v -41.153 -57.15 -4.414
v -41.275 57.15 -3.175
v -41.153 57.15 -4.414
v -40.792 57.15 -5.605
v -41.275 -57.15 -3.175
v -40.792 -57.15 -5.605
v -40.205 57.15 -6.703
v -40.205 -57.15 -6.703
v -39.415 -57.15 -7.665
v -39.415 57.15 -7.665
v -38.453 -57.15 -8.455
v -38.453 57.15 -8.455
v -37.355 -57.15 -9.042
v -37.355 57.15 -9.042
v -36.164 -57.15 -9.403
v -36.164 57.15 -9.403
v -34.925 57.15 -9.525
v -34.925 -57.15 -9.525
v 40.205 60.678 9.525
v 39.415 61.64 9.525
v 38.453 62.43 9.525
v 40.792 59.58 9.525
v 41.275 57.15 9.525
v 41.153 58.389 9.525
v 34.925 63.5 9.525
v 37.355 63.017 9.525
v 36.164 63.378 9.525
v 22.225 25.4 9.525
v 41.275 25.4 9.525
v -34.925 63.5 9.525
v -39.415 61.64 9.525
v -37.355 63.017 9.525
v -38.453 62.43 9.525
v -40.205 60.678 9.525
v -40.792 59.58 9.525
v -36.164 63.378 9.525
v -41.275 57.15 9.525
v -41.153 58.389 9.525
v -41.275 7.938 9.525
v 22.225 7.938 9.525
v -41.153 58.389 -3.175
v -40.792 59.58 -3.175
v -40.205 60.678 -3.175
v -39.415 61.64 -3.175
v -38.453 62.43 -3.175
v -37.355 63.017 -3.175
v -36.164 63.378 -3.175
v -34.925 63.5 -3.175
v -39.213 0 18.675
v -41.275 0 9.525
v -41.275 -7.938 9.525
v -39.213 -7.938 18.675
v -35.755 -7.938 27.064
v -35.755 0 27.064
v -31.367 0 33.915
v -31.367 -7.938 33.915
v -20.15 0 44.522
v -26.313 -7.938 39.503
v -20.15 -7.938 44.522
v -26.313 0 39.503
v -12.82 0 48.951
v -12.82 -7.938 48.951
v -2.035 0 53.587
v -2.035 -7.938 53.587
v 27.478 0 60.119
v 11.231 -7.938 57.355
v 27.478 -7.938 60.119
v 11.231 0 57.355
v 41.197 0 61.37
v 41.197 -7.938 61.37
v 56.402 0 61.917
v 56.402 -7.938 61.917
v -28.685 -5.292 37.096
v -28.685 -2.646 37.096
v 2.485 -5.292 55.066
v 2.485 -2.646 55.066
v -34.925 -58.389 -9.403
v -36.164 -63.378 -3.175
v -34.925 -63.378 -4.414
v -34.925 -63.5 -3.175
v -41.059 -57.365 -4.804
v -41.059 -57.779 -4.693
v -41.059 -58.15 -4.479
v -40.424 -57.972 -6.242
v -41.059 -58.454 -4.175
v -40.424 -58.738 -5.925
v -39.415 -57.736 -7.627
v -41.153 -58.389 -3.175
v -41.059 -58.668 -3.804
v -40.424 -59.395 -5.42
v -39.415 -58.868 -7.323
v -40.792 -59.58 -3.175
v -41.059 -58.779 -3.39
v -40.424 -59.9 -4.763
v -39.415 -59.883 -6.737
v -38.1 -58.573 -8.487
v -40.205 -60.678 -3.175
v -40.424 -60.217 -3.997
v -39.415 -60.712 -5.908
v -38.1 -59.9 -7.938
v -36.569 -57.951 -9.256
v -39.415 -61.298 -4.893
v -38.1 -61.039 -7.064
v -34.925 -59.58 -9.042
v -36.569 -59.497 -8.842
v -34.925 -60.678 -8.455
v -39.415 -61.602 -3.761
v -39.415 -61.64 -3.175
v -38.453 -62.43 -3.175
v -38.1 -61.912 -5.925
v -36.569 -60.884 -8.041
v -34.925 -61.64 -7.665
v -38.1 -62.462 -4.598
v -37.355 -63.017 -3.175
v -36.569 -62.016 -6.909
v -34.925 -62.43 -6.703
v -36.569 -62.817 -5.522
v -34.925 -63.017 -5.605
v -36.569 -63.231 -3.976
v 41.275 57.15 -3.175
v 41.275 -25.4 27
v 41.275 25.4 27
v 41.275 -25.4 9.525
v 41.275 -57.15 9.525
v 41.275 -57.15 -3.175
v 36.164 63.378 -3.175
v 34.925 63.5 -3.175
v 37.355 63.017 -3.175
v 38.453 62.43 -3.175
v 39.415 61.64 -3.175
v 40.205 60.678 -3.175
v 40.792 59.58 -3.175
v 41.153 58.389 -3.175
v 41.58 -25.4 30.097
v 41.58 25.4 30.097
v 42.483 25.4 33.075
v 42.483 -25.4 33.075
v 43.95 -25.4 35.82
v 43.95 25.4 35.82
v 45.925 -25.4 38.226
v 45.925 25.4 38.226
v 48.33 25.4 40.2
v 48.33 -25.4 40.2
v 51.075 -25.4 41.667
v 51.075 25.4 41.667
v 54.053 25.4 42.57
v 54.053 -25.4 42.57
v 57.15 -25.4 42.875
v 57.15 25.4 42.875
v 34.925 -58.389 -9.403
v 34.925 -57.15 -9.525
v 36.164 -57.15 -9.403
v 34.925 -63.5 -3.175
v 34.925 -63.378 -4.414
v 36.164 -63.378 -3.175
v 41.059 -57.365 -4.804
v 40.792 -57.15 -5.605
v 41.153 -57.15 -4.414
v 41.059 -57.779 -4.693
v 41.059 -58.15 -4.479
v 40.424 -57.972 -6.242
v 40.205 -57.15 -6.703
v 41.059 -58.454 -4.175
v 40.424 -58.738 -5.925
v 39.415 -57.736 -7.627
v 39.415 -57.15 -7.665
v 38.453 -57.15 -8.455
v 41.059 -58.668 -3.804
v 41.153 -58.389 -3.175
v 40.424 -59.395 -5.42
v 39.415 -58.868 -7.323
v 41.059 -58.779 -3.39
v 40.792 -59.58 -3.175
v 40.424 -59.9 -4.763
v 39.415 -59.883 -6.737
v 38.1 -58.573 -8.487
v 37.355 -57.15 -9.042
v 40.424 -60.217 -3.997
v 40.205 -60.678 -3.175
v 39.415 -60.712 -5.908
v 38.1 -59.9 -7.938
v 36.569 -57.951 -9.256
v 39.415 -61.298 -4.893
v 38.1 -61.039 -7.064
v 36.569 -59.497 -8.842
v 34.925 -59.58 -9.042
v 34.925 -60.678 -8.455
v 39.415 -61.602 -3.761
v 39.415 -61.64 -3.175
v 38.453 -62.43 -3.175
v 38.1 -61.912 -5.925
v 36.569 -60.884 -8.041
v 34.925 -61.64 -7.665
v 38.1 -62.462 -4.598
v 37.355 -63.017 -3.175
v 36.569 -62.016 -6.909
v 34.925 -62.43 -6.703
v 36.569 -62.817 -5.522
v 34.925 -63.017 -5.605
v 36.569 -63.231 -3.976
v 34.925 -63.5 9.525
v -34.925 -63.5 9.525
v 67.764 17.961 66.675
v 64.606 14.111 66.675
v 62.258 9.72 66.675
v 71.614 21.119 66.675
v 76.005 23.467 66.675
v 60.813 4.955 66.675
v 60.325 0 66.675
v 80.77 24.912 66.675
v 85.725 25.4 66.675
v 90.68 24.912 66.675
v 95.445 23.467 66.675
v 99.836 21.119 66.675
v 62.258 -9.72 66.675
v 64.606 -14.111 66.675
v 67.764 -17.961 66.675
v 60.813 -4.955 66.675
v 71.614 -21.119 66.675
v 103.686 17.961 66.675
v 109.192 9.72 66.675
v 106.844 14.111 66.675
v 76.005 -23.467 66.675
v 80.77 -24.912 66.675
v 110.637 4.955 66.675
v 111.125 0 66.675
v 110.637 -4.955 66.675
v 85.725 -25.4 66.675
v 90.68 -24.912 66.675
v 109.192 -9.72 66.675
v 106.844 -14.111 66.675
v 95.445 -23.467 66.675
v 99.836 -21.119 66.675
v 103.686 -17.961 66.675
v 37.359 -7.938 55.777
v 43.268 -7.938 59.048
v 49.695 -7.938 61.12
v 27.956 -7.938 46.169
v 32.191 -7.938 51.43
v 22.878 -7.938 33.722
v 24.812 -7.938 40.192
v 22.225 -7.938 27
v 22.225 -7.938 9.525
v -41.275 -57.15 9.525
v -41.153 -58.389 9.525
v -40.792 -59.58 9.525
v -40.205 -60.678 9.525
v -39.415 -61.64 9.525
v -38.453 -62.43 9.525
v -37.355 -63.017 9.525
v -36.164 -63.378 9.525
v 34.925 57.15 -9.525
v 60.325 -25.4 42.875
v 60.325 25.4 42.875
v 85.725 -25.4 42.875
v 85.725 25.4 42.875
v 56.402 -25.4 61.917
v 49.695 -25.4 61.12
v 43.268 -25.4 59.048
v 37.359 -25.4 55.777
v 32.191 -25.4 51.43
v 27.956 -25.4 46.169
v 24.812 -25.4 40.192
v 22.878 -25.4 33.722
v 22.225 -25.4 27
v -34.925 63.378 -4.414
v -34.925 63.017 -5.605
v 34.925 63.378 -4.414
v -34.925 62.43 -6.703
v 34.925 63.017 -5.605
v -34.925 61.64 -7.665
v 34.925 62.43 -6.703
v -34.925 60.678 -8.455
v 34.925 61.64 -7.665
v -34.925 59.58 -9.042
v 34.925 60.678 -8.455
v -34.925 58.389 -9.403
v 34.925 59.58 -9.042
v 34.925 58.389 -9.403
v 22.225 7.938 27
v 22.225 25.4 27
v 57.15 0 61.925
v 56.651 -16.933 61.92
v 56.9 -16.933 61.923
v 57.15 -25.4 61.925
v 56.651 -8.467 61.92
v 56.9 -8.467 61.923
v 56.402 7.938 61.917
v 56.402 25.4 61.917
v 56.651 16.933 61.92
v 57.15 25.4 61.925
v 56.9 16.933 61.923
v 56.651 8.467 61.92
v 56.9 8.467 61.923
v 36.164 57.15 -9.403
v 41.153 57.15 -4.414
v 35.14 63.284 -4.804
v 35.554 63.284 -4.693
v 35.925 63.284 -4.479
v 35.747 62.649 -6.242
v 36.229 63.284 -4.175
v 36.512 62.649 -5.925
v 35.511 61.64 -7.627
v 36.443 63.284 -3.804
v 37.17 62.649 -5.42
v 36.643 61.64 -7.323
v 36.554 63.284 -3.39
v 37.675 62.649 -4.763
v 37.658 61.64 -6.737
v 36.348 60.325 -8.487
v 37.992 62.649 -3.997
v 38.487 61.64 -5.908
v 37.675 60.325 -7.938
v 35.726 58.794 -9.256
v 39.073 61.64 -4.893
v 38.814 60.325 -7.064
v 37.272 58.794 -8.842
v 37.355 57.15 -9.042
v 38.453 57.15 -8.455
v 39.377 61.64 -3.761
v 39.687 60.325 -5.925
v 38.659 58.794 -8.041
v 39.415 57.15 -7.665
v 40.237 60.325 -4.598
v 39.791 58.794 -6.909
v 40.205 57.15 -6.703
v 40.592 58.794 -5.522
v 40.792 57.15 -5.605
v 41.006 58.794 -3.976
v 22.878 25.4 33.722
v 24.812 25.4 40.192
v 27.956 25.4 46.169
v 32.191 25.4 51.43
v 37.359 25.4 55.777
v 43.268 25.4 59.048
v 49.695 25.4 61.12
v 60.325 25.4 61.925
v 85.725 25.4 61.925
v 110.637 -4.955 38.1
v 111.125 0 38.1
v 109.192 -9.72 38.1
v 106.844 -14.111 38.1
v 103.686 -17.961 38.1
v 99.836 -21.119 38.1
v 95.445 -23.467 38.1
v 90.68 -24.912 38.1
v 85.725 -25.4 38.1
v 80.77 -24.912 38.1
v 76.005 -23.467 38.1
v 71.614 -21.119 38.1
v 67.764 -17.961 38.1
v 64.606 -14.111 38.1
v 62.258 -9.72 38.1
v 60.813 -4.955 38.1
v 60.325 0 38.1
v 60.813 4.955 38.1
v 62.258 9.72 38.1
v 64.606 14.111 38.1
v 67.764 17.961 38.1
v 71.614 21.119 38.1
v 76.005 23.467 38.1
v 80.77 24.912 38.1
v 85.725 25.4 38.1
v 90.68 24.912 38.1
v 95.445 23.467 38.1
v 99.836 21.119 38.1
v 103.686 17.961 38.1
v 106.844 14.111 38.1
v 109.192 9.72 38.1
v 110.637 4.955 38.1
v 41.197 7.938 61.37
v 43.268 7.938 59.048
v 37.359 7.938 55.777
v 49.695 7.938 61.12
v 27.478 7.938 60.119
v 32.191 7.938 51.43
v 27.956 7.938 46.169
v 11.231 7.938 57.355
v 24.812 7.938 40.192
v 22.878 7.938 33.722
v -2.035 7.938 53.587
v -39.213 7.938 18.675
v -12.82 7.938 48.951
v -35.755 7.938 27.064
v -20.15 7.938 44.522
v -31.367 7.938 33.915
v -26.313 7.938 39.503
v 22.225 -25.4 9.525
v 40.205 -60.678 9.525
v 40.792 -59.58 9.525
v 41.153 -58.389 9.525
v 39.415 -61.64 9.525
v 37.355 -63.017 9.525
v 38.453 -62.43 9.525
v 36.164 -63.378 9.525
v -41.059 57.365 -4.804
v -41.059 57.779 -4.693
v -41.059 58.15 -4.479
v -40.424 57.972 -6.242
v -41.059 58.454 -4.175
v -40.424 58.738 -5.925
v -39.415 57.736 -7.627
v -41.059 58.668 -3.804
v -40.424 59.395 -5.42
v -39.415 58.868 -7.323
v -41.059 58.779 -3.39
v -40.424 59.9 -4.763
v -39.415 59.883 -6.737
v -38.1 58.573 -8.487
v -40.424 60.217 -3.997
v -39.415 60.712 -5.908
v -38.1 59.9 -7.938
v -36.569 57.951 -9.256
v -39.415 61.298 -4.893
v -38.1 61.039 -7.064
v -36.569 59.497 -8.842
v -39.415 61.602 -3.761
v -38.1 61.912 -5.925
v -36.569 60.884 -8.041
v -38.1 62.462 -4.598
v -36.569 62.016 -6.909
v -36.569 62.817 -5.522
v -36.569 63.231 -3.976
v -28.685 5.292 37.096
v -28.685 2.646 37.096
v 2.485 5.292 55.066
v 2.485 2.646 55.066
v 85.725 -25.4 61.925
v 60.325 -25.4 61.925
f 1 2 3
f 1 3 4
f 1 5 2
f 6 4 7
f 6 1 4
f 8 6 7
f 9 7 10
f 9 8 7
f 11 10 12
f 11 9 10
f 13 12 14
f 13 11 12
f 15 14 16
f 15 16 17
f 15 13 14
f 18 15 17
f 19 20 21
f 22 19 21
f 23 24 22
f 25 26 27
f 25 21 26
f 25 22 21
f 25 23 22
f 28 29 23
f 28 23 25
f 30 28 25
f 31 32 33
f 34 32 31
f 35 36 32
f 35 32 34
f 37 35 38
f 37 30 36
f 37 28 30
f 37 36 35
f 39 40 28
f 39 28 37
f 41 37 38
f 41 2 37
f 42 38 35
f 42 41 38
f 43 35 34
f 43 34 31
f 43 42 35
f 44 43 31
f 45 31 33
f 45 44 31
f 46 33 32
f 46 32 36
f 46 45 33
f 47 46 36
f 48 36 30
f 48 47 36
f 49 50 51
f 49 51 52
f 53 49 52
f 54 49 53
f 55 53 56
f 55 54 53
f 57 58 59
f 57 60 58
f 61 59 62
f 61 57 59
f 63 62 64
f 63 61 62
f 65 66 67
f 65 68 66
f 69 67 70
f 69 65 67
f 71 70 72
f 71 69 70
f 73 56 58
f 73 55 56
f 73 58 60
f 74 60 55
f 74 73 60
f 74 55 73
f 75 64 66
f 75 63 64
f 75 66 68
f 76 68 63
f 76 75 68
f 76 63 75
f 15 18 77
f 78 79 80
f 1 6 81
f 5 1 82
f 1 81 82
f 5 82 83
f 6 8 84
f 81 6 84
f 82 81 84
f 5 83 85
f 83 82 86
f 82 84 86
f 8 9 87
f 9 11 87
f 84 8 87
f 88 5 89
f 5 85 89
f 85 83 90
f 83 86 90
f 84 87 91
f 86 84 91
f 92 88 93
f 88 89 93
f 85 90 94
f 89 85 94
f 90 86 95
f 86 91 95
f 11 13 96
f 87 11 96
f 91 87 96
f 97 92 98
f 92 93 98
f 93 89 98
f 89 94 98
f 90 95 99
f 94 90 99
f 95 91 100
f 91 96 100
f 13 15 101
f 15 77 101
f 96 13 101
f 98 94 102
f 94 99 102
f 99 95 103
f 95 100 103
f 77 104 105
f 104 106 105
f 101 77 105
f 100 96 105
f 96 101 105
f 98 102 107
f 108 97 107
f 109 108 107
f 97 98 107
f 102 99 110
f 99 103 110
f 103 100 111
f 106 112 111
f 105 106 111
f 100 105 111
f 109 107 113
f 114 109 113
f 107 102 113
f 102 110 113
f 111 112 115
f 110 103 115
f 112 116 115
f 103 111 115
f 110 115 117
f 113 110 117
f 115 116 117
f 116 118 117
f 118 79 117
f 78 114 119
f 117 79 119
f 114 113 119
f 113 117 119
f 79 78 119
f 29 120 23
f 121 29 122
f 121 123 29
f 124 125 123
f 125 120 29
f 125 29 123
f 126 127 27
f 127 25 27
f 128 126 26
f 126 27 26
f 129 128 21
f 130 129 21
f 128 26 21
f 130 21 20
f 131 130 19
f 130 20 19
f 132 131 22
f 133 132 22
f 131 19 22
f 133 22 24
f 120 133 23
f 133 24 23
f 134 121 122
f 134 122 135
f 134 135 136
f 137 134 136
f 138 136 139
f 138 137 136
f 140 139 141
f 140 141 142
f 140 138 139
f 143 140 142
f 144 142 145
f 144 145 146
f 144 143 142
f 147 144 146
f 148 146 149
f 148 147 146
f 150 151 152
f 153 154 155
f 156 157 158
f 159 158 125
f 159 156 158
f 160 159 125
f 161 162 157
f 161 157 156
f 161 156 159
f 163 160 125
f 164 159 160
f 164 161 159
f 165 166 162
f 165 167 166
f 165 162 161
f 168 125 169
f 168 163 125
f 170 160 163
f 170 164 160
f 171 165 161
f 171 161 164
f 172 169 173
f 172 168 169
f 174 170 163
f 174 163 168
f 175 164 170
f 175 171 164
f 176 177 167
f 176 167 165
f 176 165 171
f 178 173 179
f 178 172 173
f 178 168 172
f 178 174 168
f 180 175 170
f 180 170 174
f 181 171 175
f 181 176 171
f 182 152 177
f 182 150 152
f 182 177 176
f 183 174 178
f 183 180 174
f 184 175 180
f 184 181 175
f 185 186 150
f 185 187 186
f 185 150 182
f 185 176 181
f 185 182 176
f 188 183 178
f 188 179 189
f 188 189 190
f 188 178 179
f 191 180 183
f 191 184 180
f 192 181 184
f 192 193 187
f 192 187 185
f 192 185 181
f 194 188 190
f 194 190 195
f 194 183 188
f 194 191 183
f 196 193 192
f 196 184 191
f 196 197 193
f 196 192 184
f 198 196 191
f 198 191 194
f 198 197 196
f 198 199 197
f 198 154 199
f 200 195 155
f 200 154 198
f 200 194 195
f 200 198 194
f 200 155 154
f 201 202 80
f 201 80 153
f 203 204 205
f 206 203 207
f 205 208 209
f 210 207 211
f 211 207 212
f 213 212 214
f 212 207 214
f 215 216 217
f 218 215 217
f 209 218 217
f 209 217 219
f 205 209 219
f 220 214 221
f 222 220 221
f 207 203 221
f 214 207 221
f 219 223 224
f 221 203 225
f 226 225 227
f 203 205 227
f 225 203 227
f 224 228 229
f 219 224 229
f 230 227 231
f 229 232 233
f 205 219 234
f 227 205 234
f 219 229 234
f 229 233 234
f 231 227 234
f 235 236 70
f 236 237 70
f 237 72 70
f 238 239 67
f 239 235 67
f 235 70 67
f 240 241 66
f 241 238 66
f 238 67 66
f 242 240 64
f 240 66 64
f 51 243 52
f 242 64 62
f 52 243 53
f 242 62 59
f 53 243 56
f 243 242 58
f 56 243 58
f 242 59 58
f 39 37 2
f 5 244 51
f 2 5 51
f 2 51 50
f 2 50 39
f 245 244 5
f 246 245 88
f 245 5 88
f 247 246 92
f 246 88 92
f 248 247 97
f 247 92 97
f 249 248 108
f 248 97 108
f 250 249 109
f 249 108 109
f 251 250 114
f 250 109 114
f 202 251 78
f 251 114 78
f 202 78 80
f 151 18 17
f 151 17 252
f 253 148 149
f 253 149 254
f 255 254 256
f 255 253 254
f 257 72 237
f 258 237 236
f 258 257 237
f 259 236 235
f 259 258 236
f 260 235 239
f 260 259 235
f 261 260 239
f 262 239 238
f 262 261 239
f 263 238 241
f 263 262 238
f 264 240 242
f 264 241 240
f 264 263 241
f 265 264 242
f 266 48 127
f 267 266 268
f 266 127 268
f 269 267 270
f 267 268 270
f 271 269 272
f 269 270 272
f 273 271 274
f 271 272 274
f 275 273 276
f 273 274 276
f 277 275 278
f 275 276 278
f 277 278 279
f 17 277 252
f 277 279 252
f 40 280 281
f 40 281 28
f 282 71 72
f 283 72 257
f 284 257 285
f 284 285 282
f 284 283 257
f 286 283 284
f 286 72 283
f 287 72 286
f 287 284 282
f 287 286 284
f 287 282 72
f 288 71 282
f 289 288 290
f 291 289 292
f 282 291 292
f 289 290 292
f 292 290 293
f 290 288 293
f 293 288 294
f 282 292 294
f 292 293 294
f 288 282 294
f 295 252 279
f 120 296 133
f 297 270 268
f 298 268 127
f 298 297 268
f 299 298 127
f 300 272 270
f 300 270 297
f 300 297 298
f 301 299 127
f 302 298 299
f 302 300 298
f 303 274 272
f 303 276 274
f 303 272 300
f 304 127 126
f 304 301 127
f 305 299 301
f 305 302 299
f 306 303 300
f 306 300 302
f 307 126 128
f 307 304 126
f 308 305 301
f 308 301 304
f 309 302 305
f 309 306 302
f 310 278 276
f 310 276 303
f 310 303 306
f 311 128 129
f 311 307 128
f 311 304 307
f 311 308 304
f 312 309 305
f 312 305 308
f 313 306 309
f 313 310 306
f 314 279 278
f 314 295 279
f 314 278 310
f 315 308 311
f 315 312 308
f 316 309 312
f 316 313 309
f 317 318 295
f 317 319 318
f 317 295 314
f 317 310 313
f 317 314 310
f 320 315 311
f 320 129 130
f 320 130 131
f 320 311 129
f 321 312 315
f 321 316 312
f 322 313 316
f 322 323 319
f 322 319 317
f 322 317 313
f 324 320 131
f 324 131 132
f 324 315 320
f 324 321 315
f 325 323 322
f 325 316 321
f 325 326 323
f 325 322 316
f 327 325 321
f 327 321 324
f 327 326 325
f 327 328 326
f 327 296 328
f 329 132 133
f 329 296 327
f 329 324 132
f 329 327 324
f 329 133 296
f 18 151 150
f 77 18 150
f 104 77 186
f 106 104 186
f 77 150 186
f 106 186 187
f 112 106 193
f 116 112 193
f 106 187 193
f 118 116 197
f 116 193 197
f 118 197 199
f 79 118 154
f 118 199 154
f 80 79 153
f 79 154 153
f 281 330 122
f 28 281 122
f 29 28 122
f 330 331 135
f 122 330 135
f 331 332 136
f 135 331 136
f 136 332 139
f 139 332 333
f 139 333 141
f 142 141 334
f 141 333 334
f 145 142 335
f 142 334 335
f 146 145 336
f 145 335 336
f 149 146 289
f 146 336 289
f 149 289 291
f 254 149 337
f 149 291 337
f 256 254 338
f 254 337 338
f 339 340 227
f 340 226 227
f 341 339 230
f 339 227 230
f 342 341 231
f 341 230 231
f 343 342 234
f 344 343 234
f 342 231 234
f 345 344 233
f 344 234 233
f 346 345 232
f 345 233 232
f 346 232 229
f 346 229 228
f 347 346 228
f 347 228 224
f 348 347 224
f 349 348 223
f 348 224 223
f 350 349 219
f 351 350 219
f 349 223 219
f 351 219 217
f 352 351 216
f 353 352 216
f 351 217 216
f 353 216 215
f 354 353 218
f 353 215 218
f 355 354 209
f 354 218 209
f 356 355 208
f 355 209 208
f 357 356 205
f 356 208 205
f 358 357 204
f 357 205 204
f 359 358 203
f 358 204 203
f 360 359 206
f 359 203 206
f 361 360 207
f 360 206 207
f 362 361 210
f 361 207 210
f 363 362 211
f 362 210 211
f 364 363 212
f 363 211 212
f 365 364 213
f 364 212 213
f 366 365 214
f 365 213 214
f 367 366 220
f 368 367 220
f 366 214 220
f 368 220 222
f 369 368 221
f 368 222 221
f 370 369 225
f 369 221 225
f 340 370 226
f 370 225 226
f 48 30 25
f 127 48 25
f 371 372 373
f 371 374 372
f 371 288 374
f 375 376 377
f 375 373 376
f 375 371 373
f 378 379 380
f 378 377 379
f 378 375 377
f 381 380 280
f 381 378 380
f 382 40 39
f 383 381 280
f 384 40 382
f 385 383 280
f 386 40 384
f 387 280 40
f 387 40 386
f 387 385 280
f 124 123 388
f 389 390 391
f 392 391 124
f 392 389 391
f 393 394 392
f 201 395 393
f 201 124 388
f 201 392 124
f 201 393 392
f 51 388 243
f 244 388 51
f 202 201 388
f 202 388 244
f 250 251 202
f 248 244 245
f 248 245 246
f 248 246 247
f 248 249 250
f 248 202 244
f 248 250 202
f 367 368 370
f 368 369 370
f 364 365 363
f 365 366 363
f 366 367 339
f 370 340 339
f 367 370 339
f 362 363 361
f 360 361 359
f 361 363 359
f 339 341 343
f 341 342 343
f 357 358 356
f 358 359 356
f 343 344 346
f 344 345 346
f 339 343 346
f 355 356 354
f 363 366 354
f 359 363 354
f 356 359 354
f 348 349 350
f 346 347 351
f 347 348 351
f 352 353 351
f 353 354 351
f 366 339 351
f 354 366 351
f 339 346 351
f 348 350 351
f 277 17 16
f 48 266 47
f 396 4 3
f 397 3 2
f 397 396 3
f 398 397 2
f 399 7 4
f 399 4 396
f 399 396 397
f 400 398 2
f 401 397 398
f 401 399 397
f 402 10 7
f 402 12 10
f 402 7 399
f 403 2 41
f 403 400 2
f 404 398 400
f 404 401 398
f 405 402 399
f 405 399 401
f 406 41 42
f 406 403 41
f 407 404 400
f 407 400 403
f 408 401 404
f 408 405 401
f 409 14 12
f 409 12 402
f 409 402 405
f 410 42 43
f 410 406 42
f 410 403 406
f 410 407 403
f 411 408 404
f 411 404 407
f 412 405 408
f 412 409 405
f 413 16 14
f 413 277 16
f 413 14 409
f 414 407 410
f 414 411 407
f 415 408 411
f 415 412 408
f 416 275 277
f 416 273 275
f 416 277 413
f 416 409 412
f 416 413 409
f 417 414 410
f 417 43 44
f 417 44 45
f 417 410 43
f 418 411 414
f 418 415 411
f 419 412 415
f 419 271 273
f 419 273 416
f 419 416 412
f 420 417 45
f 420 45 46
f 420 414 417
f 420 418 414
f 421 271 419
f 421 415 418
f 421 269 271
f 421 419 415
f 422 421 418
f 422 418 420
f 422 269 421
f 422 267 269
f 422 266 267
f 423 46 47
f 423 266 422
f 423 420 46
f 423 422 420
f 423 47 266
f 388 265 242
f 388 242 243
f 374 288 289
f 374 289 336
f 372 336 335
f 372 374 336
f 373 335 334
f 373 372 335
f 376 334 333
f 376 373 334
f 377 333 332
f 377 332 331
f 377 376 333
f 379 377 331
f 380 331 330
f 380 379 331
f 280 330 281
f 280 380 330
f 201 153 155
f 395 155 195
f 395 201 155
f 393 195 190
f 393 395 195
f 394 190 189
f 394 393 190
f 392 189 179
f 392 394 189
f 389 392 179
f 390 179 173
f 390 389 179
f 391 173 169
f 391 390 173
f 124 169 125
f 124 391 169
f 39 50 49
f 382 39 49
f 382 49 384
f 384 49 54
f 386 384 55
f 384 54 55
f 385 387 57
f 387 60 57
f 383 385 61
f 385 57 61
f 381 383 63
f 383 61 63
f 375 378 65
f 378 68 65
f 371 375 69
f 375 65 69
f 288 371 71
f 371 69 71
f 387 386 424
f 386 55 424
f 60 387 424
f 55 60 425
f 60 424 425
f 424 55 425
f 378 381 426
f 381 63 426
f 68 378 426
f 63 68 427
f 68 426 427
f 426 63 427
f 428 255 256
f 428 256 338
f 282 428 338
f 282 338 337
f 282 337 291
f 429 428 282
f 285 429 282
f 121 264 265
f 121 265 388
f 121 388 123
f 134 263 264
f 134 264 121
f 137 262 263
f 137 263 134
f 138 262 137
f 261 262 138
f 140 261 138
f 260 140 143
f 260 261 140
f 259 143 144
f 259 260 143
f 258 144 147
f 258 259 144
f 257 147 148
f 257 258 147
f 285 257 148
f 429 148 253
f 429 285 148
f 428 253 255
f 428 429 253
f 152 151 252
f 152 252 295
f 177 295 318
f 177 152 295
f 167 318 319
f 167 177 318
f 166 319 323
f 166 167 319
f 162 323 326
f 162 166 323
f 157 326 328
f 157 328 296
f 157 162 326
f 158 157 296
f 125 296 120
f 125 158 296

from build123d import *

# Parameters (mm, degrees)
F1_DEPTH = 63.5
F0_W     = 25.4
F0_H     = 19.0500000095
F2_DEPTH = 25.4
F3_DEPTH = 7.9375
F5_R     = 6.35


with BuildPart() as f1:
    # F0 (on Front) → F1 (new body, symmetric)
    with BuildSketch(Plane.XZ):
        Polygon((22.2249999905, 9.525), (-41.275, 9.525), (-41.275, -9.525), (41.275, -9.525), (41.275, 9.525), align=None)
    extrude(amount=F1_DEPTH, both=True)

    # F0 (on Front) → F2 (join, symmetric)
    with BuildSketch(Plane.XZ):
        with BuildLine():
            Line((22.2249999905, 27.0002), (22.2249999905, 9.525))
            Line((22.2249999905, 9.525), (41.275, 9.525))
            Line((41.275, 9.525), (41.275, 27.0002))
            ThreePointArc((41.275, 27.0002), (45.9246798487, 38.2255201513), (57.15, 42.8752))
            Line((57.15, 42.8752), (60.325, 42.8752))
            Line((60.325, 42.8752), (60.325, 61.9252000095))
            Line((60.325, 61.9252000095), (57.15, 61.9252000095))
            add(Edge.make_bspline(
                [(56.4015486097, 61.9171793393), (56.6504694702, 61.9201171261), (56.8999529418, 61.9227908011), (57.15, 61.9252000095)],
                knots=[111.0898267505, 111.0898267505, 111.0898267505, 111.0898267505, 111.504536168, 111.504536168, 111.504536168, 111.504536168], degree=3))
            ThreePointArc((56.4015486097, 61.9171793393), (32.191080848, 51.4298537107), (22.2249999905, 27.0002))
        make_face()
        with Locations((73.025, 52.4002000047)):
            Rectangle(F0_W, F0_H)
    extrude(amount=F2_DEPTH, both=True)

    # F0 (on Front) → F3 (join, symmetric)
    with BuildSketch(Plane.XZ):
        with BuildLine():
            add(Edge.make_bspline(
                [(-41.275, 9.525), (-36.5862940816, 41.3915538869), (-10.2778517333, 61.1302229482), (56.4015486097, 61.9171793393)],
                knots=[0, 0, 0, 0, 111.0898267505, 111.0898267505, 111.0898267505, 111.0898267505], degree=3))
            Line((-41.275, 9.525), (22.2249999905, 9.525))
            Line((22.2249999905, 9.525), (22.2249999905, 27.0002))
            ThreePointArc((22.2249999905, 27.0002), (32.191080848, 51.4298537107), (56.4015486097, 61.9171793393))
        make_face()
    extrude(amount=F3_DEPTH, both=True)

    # F5
    f5_edges = [f1.edges().sort_by_distance(p)[0] for p in [
        (0, -63.5, -9.525),
        (41.275, 0, -9.525),
        (0, 63.5, -9.525),
        (-41.275, 0, -9.525),
        (41.275, 63.5, 0),
        (-41.275, 63.5, 0),
        (-41.275, -63.5, 0),
        (41.275, -63.5, 0),
    ]]
    fillet(f5_edges, radius=F5_R)


with BuildPart() as f4:
    # F0 (on Front) → F4 (revolve)
    with BuildSketch(Plane.XZ):
        Polygon((85.725, 66.675), (85.725, 61.9252000095), (85.725, 42.8752), (85.725, 38.1), (111.125, 38.1), (111.125, 66.675), align=None)
    revolve(axis=Axis((85.725, 0, 52.4002000047), (0, 0, -1)))


solid = Compound([f1.part, f4.part])
